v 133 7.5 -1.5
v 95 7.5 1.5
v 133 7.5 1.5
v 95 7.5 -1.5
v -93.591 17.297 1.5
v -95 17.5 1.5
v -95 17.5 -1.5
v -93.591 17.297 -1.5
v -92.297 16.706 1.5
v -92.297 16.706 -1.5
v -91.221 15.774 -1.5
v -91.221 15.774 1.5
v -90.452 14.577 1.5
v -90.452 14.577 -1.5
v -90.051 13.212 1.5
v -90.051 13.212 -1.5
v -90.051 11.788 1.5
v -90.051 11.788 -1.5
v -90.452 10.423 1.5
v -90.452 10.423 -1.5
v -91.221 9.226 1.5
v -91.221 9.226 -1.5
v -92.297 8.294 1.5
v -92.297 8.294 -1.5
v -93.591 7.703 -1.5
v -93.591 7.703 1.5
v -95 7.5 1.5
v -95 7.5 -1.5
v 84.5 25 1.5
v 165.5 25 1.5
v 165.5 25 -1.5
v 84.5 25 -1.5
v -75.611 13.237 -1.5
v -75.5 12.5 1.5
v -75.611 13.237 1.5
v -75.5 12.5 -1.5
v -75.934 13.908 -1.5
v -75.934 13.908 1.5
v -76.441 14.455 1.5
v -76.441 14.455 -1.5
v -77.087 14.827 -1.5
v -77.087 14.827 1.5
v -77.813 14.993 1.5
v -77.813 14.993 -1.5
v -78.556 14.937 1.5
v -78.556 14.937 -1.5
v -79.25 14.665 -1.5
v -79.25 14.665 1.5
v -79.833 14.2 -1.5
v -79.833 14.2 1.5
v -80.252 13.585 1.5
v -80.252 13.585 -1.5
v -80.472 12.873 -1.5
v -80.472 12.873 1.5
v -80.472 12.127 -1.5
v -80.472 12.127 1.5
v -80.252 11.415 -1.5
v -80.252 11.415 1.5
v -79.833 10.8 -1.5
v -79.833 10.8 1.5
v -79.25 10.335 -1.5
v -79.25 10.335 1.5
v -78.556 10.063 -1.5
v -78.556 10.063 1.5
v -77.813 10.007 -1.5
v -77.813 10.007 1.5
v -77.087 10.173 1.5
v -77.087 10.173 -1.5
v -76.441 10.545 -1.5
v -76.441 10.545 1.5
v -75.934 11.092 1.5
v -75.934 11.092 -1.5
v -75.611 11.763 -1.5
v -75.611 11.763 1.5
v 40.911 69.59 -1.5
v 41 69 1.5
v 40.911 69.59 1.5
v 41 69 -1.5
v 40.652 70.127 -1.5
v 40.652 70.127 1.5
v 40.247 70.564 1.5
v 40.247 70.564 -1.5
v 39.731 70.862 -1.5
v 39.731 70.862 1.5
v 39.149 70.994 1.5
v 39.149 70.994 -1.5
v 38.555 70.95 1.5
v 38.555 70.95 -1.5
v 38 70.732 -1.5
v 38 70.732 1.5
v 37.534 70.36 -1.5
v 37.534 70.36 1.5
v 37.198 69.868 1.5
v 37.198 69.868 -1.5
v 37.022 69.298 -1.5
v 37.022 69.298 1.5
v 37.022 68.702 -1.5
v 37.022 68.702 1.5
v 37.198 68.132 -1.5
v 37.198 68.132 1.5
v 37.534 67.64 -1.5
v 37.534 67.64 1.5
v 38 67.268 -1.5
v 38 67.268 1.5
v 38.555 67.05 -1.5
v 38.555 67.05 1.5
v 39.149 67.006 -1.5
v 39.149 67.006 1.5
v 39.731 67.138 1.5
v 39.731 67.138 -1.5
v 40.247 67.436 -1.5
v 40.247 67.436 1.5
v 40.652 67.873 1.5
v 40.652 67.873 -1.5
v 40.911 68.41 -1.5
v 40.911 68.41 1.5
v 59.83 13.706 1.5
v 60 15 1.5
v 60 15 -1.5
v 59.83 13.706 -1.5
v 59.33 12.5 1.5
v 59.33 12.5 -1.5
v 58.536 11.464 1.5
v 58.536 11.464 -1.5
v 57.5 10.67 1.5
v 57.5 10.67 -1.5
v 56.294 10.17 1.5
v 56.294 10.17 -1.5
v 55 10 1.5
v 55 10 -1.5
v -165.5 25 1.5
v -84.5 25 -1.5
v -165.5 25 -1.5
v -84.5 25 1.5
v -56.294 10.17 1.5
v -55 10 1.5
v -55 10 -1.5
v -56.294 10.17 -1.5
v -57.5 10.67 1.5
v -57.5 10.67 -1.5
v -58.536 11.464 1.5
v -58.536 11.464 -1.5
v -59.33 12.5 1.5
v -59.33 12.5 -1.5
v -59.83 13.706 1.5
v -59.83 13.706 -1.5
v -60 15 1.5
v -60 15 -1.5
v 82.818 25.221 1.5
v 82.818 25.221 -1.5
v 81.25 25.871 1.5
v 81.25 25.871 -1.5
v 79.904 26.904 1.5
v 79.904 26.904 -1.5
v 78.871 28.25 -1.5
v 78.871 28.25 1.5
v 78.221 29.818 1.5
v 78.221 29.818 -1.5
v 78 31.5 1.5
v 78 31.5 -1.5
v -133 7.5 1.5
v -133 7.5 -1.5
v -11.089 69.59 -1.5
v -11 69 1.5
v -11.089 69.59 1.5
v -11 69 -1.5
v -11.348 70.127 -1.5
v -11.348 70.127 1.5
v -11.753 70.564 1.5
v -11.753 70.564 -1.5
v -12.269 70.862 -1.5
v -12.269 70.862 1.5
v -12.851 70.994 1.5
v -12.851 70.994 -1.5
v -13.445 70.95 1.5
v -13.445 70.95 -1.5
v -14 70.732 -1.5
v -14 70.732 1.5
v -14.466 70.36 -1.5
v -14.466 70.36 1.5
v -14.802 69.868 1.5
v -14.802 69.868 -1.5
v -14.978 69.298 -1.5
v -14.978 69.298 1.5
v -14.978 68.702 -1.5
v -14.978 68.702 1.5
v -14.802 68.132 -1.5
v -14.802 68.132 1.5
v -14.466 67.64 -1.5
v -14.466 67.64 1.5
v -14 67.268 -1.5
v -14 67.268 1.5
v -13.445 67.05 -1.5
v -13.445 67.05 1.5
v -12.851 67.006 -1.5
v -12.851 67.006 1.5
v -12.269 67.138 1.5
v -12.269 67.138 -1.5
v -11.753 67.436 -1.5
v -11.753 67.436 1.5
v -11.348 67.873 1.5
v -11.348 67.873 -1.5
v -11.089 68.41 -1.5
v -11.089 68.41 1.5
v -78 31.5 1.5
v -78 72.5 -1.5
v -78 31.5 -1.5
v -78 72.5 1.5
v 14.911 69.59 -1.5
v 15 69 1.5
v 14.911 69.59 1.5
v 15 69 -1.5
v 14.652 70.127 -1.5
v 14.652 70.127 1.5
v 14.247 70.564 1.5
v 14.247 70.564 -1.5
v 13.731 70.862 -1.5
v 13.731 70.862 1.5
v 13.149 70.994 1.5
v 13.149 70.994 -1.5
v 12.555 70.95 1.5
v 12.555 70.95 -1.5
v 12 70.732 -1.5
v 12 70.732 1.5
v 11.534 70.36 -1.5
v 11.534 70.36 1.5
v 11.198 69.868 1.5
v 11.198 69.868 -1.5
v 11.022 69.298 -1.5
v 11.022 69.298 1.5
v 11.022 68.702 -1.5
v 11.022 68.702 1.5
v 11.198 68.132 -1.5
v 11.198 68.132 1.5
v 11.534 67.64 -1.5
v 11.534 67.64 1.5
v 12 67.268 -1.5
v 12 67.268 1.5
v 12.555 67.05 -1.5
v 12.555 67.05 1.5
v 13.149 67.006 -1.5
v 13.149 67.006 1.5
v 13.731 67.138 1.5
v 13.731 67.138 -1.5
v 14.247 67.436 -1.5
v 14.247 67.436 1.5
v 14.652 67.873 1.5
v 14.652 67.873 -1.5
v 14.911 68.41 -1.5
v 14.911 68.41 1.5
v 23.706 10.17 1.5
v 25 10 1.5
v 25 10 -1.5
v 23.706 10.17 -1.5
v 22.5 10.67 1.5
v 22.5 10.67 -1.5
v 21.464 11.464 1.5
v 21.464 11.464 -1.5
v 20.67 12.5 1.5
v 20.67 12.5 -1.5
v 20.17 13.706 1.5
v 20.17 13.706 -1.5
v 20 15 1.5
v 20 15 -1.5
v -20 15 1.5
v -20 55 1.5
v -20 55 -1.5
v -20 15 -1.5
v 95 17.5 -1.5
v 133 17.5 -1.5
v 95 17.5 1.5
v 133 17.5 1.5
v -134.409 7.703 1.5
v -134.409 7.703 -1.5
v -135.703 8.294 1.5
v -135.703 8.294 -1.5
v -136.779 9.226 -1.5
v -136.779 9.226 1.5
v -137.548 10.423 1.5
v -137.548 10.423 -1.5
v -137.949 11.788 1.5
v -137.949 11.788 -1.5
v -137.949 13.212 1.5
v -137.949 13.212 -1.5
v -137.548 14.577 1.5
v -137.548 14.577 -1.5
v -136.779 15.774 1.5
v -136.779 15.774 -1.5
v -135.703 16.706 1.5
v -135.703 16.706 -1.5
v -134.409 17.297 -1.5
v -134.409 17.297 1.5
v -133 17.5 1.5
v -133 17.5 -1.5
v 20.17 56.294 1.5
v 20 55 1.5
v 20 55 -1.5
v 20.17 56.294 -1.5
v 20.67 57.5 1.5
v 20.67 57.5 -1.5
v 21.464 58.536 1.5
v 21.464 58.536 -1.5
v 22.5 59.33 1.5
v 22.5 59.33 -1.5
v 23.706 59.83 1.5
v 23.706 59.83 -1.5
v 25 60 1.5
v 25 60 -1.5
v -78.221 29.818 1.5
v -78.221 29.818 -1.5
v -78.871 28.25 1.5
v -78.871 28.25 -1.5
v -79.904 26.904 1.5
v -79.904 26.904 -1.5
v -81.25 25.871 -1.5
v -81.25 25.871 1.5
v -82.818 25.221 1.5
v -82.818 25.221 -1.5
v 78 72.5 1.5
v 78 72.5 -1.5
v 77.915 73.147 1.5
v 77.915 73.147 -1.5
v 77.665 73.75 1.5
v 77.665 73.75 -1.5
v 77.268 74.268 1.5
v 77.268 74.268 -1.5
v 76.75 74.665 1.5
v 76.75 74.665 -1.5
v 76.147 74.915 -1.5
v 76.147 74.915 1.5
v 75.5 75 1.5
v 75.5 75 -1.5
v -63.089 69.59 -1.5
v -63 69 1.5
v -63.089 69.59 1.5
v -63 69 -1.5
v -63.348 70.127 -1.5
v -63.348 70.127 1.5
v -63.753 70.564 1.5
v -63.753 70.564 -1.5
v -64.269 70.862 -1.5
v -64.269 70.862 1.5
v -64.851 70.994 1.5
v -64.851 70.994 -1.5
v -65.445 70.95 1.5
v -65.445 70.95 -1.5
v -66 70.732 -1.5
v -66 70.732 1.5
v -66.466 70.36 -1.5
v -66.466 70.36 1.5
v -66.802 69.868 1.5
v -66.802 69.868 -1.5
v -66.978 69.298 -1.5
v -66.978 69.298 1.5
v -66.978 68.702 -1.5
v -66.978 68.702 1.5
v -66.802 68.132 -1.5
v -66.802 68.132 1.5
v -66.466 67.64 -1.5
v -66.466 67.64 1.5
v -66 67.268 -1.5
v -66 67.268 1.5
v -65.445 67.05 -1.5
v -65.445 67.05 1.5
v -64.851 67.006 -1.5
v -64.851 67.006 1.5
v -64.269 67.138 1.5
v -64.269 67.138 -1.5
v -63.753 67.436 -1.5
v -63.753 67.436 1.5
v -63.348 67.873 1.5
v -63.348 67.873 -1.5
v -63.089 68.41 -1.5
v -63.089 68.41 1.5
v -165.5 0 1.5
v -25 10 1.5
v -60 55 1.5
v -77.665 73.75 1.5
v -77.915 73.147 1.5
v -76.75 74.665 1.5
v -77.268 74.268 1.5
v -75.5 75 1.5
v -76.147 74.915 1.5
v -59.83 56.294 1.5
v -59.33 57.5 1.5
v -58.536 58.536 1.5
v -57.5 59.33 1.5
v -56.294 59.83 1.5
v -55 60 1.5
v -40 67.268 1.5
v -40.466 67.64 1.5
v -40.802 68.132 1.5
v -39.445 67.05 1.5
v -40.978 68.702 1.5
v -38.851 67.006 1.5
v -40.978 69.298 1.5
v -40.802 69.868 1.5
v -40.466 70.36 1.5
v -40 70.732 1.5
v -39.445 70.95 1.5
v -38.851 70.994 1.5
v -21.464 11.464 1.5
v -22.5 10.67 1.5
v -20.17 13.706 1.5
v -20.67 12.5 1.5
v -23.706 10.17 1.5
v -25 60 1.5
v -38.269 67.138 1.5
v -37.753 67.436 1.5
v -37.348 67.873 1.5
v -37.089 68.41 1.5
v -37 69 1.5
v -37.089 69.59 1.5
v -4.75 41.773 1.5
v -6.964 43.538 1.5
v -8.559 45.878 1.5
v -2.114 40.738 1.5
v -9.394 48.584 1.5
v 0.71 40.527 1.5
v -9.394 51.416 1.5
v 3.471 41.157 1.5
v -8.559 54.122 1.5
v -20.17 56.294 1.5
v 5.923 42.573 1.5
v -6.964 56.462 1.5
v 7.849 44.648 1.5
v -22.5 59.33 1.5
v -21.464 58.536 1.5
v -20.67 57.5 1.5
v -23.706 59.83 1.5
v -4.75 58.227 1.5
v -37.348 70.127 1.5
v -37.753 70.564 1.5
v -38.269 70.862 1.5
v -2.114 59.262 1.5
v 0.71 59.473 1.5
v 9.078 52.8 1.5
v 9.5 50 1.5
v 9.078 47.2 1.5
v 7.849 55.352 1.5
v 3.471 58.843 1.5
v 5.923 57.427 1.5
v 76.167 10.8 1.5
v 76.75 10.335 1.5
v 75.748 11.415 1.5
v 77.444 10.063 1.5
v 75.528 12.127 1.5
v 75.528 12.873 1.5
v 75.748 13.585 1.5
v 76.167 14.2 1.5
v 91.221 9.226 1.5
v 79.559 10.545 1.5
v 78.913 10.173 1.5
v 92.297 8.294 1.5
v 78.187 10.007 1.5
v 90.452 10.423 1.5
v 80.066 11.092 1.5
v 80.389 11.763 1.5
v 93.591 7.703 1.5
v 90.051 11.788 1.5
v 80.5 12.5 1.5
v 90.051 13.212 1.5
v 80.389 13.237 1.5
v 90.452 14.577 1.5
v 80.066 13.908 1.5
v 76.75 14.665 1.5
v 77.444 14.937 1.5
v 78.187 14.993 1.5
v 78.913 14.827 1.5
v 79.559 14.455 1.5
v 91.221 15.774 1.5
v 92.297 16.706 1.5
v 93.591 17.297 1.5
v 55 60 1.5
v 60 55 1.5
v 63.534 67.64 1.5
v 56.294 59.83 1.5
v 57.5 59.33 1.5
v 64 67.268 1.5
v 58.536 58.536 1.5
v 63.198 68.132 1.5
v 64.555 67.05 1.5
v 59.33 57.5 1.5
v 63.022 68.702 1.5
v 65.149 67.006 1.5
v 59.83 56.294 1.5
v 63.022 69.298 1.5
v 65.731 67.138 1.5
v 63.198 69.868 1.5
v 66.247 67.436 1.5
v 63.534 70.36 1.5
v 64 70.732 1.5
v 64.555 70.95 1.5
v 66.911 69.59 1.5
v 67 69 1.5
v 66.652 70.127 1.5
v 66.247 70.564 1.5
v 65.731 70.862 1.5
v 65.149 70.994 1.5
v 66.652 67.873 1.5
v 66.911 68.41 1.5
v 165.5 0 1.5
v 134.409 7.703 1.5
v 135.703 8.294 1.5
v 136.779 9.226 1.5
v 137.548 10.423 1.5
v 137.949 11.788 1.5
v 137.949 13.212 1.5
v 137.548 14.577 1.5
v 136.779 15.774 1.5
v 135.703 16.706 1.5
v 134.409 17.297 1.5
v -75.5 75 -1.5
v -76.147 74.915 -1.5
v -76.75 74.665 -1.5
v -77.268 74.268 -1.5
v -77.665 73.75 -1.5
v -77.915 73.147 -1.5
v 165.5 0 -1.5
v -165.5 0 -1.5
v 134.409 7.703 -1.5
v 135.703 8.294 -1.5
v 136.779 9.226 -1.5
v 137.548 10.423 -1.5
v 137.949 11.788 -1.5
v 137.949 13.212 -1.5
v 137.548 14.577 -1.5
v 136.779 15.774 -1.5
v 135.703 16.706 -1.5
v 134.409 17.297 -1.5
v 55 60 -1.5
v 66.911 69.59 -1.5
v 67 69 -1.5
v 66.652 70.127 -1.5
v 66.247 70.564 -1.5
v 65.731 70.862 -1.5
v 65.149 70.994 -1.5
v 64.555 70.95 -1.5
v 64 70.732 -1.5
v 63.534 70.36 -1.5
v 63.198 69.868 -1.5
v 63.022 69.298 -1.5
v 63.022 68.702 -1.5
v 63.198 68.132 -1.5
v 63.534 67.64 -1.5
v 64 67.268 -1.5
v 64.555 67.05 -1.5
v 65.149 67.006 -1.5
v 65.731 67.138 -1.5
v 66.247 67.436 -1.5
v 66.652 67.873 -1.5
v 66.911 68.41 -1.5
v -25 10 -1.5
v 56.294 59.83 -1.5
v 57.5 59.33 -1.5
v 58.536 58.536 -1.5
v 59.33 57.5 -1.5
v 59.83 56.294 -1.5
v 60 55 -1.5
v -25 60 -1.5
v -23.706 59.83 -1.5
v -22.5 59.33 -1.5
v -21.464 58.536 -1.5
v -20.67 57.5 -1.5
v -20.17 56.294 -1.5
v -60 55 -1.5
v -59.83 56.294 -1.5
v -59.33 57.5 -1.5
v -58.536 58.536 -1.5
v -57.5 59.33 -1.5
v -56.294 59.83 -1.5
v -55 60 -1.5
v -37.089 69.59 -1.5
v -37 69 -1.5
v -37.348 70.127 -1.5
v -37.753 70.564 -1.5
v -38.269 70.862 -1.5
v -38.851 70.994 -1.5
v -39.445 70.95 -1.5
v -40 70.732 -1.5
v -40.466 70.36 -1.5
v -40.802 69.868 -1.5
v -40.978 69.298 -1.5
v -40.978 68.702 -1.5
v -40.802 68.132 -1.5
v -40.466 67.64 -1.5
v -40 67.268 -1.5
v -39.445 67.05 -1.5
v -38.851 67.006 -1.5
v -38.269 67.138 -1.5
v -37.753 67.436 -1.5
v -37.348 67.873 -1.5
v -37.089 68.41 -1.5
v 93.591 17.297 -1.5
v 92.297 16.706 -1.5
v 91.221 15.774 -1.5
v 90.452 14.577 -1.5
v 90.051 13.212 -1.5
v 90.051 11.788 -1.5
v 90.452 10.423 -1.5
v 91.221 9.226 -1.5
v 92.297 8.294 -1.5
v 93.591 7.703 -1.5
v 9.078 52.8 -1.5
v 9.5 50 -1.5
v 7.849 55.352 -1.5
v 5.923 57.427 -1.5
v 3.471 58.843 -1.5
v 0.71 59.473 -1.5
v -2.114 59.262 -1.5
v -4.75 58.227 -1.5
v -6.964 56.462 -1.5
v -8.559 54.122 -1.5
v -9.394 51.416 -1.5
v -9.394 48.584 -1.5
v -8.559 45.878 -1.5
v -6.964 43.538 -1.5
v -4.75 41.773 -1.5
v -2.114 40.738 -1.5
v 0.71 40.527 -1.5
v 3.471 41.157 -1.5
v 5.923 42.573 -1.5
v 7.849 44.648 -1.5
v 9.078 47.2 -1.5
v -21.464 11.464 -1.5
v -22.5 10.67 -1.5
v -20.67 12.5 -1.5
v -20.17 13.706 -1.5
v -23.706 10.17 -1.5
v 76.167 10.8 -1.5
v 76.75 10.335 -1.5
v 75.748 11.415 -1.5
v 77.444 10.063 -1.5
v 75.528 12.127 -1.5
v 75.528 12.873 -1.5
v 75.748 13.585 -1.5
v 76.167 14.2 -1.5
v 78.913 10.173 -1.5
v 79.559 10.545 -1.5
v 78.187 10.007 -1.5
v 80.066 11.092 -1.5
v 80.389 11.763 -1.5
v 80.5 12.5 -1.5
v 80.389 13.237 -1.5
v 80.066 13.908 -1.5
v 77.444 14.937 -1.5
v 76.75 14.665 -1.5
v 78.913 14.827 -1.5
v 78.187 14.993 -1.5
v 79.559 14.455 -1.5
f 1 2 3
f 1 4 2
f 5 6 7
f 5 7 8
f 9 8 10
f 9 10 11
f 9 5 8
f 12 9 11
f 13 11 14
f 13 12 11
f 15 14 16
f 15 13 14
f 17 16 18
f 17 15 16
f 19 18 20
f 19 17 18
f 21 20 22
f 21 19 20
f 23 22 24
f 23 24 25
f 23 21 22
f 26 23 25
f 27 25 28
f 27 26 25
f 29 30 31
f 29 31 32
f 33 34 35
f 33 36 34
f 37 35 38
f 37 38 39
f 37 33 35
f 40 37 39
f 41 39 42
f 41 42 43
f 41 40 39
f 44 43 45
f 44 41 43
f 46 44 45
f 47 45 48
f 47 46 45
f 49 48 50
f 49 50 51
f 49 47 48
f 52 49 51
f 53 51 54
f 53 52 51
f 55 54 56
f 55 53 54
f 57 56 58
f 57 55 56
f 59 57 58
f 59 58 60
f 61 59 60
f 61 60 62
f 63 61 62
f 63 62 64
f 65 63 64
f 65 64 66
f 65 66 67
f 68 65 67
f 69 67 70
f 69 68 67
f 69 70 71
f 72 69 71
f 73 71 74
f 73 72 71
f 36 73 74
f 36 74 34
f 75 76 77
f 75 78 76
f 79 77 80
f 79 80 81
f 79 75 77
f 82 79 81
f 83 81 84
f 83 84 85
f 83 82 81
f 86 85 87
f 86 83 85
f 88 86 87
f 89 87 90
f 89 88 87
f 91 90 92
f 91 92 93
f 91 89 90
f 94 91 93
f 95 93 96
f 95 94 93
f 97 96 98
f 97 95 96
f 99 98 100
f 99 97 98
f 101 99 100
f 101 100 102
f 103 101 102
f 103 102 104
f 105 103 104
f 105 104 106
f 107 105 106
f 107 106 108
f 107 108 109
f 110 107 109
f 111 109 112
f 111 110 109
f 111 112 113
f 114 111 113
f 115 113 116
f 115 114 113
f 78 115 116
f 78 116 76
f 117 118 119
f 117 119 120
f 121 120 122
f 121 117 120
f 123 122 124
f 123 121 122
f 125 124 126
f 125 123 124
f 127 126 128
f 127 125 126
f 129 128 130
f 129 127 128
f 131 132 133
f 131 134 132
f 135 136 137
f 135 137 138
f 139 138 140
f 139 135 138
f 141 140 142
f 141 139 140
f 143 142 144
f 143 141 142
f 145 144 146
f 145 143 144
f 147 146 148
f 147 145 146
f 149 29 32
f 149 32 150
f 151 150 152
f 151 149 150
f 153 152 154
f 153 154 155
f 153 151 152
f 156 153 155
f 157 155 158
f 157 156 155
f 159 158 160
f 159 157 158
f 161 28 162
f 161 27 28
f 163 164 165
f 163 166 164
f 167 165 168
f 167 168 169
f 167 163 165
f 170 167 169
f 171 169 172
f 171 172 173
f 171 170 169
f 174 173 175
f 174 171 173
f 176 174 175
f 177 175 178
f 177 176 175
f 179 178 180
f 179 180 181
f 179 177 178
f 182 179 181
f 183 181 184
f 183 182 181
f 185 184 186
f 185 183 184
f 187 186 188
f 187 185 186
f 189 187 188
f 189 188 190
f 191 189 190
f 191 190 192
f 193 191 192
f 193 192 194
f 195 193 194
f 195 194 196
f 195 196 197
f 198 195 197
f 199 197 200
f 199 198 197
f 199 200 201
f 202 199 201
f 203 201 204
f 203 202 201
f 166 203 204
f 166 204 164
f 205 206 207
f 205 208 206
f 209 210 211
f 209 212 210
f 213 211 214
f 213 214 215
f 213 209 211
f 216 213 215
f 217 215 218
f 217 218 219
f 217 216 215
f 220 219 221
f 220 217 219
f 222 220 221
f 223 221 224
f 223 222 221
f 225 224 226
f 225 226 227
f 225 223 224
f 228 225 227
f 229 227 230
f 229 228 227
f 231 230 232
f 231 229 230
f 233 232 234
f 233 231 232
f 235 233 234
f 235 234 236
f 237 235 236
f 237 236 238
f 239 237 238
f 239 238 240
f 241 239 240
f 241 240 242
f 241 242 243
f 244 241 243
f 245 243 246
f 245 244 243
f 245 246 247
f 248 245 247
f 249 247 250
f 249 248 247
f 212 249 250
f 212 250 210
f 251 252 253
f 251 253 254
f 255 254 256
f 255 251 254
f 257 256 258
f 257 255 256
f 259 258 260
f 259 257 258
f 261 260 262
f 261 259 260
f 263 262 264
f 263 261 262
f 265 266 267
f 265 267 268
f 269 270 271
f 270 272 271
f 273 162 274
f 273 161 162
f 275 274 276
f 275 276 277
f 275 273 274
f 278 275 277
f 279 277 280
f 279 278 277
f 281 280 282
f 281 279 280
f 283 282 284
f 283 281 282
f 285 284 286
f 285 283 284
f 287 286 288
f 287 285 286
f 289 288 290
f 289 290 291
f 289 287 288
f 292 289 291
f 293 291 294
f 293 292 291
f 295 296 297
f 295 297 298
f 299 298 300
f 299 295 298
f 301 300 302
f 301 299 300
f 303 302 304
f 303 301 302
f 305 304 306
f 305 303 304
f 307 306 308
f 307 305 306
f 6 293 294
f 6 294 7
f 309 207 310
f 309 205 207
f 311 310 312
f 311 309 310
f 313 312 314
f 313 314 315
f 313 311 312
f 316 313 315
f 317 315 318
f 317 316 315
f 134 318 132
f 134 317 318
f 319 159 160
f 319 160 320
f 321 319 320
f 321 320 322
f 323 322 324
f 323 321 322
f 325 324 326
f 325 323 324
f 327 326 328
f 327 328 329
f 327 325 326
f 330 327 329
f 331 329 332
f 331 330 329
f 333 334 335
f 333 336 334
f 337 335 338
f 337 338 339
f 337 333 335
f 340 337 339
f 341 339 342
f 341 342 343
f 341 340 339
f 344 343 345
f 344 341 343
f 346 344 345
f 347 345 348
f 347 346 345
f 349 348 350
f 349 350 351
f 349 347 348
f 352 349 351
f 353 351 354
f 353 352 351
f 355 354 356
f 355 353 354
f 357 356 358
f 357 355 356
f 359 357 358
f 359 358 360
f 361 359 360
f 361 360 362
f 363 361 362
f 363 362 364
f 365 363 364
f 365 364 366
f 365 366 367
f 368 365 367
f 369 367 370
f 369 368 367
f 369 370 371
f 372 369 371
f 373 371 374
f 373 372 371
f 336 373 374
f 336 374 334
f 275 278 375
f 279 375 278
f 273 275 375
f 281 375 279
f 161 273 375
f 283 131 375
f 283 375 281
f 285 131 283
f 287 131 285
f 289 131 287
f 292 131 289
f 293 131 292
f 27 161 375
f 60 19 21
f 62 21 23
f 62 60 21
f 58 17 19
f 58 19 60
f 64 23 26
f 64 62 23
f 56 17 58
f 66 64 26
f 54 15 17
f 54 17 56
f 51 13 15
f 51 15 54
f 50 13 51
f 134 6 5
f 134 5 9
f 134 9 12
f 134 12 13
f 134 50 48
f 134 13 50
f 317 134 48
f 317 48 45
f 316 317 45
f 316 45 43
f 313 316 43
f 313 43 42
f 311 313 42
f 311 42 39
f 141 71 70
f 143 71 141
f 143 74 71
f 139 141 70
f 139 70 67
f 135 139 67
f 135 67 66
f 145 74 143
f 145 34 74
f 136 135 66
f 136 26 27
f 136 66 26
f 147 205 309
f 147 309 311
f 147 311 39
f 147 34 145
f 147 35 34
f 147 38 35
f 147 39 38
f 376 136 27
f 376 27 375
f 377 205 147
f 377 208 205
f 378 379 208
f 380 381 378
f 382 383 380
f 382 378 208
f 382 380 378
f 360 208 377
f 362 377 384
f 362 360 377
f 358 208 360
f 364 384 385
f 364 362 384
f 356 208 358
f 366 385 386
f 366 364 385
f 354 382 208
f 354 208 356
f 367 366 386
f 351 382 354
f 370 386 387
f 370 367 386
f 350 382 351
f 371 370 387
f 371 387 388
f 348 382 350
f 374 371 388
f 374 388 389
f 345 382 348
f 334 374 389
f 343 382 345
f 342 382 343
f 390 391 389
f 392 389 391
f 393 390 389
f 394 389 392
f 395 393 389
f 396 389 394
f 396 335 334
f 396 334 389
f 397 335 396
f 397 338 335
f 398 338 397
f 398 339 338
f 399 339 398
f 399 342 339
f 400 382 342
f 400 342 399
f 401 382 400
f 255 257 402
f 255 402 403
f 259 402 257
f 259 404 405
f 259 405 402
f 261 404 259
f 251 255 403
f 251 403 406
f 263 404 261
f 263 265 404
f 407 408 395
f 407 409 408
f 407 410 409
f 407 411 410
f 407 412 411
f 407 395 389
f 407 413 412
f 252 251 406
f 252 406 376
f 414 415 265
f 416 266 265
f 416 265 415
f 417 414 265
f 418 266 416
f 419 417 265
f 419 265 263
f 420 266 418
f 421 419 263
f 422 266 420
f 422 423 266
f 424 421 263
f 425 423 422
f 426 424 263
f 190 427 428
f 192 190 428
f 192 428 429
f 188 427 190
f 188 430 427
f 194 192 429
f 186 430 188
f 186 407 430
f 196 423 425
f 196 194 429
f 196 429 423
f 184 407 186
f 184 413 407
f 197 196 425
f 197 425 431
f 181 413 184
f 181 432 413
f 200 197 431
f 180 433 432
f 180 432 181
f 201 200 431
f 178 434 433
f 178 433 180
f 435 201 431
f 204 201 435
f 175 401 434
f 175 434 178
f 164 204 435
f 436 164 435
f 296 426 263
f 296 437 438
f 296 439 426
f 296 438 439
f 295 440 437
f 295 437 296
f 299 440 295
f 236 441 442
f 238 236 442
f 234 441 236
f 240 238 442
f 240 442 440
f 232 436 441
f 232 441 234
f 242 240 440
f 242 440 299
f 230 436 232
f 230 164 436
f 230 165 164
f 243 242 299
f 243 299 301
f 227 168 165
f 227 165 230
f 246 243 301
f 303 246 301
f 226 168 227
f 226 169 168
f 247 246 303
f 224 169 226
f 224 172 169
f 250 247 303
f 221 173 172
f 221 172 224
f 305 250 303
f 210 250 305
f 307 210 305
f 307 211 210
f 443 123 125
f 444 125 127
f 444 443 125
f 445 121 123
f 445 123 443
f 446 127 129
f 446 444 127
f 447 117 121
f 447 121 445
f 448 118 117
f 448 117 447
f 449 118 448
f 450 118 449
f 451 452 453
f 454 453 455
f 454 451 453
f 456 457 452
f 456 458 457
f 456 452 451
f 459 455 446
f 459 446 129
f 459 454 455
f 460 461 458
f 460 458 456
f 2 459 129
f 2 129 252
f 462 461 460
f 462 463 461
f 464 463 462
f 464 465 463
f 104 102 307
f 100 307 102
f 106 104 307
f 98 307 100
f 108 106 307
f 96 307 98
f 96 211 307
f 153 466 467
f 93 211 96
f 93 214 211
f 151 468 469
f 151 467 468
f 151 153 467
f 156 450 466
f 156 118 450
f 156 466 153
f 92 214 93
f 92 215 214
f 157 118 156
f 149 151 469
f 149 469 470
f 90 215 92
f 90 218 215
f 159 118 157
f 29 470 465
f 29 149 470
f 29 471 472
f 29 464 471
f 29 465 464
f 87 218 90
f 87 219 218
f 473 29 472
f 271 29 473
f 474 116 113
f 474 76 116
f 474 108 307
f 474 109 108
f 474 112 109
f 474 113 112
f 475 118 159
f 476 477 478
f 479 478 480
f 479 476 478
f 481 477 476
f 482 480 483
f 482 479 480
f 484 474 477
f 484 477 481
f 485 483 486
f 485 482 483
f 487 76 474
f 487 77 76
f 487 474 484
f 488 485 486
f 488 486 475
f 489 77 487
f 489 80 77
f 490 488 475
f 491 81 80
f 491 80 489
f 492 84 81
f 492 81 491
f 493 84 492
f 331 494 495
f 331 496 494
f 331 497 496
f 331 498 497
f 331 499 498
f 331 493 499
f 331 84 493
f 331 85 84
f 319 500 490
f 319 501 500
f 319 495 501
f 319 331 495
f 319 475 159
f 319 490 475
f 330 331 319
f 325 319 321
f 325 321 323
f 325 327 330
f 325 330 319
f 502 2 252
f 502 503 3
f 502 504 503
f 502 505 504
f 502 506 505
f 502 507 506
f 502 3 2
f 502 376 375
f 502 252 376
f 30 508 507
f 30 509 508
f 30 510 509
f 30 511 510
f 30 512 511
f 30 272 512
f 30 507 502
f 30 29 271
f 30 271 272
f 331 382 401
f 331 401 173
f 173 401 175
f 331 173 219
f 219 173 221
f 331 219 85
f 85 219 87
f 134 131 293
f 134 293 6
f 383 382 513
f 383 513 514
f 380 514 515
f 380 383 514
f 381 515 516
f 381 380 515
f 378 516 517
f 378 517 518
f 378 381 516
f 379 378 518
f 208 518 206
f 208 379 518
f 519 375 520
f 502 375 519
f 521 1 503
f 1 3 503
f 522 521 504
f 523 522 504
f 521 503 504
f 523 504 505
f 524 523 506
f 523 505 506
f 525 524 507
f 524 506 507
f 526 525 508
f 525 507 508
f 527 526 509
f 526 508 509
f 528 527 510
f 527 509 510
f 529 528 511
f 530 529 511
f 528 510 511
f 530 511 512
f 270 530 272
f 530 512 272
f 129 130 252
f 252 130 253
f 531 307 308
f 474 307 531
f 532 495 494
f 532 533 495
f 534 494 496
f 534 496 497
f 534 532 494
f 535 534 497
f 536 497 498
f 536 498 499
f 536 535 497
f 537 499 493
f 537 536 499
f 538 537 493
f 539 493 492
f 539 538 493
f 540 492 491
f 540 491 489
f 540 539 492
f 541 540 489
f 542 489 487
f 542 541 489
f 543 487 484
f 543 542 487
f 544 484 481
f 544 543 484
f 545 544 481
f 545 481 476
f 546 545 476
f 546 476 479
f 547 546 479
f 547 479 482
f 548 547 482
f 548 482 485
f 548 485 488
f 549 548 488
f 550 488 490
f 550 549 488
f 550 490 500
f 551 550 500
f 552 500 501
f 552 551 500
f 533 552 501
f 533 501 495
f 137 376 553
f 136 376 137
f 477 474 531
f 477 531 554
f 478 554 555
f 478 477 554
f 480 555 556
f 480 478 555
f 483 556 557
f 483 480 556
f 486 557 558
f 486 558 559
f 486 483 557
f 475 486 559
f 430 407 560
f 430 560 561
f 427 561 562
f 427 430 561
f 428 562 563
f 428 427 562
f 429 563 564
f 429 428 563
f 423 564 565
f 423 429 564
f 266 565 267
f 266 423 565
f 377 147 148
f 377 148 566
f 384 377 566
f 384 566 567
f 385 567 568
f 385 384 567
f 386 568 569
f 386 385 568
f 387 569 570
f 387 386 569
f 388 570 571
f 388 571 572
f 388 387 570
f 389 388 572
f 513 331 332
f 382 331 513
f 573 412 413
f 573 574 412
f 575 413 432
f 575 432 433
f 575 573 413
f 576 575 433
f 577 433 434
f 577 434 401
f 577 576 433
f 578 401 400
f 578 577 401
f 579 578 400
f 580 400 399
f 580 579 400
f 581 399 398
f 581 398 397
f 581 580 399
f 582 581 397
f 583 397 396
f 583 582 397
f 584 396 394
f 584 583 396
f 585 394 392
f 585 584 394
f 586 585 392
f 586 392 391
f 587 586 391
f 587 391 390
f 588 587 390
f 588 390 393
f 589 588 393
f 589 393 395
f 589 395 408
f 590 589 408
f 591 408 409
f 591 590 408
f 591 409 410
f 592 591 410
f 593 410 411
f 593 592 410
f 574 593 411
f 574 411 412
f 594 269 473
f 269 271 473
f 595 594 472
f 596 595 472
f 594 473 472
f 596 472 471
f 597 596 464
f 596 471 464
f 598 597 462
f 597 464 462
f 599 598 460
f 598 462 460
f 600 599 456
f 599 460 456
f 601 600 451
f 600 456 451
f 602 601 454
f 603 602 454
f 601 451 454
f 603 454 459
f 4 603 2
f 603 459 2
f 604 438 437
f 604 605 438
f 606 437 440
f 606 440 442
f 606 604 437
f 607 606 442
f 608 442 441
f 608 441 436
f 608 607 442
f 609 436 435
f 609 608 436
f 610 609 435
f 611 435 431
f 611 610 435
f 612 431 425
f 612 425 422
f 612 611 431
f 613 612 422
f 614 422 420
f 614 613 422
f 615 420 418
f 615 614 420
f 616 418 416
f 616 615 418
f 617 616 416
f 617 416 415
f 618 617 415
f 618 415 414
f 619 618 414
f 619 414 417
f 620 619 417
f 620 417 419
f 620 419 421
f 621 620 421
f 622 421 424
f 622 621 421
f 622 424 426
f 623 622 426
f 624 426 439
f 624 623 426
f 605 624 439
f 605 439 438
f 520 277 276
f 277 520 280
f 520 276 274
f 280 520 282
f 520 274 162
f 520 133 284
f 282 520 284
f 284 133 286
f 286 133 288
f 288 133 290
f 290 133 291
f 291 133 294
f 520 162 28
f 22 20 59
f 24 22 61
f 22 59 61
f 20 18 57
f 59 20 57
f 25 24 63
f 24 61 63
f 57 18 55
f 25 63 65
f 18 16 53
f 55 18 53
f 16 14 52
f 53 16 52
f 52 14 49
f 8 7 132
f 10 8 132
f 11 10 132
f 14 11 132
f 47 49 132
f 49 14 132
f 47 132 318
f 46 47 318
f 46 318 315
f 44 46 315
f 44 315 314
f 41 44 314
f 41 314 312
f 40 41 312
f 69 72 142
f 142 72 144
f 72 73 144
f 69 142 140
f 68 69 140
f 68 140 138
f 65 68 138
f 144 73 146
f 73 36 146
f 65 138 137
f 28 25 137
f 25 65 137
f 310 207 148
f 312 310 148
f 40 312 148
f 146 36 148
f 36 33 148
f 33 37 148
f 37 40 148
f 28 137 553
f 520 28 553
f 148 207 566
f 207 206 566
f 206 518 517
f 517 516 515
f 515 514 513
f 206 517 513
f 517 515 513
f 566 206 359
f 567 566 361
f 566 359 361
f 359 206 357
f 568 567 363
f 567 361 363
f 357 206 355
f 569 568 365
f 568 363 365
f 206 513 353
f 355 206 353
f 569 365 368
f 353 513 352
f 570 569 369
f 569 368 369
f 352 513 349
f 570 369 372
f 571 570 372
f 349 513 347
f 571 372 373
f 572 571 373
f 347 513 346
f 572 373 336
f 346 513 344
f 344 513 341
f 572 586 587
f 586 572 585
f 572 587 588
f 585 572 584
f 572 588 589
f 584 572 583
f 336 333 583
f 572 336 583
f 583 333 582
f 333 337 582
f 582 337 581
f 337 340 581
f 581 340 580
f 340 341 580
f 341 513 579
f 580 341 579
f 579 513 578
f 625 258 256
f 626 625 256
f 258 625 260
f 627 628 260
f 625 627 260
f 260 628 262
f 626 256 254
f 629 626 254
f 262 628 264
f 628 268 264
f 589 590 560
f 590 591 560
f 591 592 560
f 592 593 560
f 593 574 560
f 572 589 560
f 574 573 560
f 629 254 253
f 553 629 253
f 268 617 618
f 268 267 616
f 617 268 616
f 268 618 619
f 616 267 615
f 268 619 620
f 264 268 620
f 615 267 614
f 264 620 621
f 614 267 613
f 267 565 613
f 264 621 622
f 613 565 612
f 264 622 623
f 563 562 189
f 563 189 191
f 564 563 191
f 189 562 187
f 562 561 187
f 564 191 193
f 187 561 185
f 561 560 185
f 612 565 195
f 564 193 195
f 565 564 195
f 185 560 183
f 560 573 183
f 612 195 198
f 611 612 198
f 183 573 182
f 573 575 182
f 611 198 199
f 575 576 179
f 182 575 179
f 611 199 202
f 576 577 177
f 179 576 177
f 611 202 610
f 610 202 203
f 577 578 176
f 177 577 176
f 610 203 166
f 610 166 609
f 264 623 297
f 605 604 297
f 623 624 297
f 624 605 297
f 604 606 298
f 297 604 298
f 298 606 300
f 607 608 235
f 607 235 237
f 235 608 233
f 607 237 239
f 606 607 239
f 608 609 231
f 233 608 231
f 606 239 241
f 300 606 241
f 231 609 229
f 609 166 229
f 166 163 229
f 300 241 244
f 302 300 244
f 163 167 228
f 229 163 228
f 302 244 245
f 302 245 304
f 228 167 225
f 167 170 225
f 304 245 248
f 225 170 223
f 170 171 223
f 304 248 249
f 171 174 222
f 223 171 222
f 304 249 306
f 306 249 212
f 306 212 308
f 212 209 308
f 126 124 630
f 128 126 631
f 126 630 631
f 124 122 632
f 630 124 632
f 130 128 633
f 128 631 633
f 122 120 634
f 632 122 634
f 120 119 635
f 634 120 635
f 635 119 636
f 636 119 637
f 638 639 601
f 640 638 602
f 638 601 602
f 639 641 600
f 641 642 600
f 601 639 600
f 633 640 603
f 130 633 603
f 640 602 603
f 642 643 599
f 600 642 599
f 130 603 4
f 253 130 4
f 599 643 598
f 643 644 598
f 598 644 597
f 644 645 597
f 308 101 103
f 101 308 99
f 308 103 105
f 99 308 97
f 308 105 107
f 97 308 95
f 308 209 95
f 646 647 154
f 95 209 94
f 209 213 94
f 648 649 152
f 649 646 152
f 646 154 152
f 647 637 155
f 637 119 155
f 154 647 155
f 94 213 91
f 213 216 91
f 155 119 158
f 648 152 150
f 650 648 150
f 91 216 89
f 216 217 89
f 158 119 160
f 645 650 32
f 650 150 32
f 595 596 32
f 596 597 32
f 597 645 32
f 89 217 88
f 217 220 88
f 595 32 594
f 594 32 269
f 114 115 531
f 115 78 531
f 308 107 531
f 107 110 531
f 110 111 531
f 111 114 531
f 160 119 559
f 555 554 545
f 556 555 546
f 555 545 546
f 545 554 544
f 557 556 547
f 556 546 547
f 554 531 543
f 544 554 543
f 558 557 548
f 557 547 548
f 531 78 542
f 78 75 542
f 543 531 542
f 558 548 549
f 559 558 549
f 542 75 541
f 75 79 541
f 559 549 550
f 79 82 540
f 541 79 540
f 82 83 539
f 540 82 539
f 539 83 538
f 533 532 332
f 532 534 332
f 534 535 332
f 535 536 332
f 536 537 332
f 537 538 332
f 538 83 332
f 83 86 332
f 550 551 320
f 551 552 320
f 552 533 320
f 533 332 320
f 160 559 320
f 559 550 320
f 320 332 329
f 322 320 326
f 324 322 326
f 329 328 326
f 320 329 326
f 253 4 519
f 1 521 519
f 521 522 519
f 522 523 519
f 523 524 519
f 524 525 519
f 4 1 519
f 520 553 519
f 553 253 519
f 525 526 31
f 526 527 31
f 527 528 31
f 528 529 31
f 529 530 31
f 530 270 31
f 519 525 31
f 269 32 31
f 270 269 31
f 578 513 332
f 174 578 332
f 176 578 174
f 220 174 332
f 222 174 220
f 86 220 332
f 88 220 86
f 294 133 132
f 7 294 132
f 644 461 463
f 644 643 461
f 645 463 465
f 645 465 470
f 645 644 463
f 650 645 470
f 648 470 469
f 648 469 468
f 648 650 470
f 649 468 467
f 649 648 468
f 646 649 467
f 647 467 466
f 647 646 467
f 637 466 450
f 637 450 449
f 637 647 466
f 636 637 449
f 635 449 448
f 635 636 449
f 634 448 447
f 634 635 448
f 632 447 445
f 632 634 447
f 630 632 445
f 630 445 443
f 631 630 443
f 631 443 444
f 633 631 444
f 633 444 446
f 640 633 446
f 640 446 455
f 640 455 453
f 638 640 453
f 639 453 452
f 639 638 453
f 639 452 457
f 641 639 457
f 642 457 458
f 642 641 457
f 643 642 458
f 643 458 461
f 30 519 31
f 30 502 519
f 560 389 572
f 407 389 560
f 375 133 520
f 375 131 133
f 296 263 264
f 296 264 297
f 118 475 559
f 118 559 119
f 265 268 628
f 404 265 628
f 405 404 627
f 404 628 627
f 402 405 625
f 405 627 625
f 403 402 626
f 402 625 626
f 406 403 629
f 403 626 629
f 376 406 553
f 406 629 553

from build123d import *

# Parameters (mm, degrees)
SKETCH1_R           = 9.5
SKETCH1_R_2         = 2
SKETCH1_R_3         = 2.5
BOSS_EXTRUDE1_DEPTH = 1.5


with BuildPart() as part:
    # Sketch1 → Boss-Extrude1 (new, symmetric)
    with BuildSketch(Plane.XY):
        with BuildLine():
            Line((165.5, 0), (165.5, 25))
            Line((165.5, 25), (84.5, 25))
            ThreePointArc((84.5, 25), (79.903805922, 26.903805922), (78, 31.5))
            Line((78, 31.5), (78, 72.5))
            ThreePointArc((78, 72.5), (77.267766953, 74.267766953), (75.5, 75))
            Line((75.5, 75), (-75.5, 75))
            ThreePointArc((-75.5, 75), (-77.267766953, 74.267766953), (-78, 72.5))
            Line((-78, 72.5), (-78, 31.5))
            ThreePointArc((-78, 31.5), (-79.903805922, 26.903805922), (-84.5, 25))
            Line((-84.5, 25), (-165.5, 25))
            Line((-165.5, 25), (-165.5, 0))
            Line((-165.5, 0), (165.5, 0))
        make_face()
        with Locations((0, 50)):
            Circle(SKETCH1_R, mode=Mode.SUBTRACT)
        with Locations((-65, 69)):
            Circle(SKETCH1_R_2, mode=Mode.SUBTRACT)
        with Locations((-39, 69)):
            Circle(SKETCH1_R_2, mode=Mode.SUBTRACT)
        with Locations((-13, 69)):
            Circle(SKETCH1_R_2, mode=Mode.SUBTRACT)
        with Locations((13, 69)):
            Circle(SKETCH1_R_2, mode=Mode.SUBTRACT)
        with Locations((39, 69)):
            Circle(SKETCH1_R_2, mode=Mode.SUBTRACT)
        with Locations((65, 69)):
            Circle(SKETCH1_R_2, mode=Mode.SUBTRACT)
        with Locations((-78, 12.5)):
            Circle(SKETCH1_R_3, mode=Mode.SUBTRACT)
        with Locations((78, 12.5)):
            Circle(SKETCH1_R_3, mode=Mode.SUBTRACT)
        with BuildLine():
            Line((-55, 60), (-25, 60))
            ThreePointArc((-25, 60), (-21.464466094, 58.535533906), (-20, 55))
            Line((-20, 55), (-20, 15))
            ThreePointArc((-20, 15), (-21.464466094, 11.464466094), (-25, 10))
            Line((-25, 10), (-55, 10))
            ThreePointArc((-55, 10), (-58.535533906, 11.464466094), (-60, 15))
            Line((-60, 15), (-60, 55))
            ThreePointArc((-60, 55), (-58.535533906, 58.535533906), (-55, 60))
        make_face(mode=Mode.SUBTRACT)
        with BuildLine():
            Line((-133, 17.5), (-95, 17.5))
            ThreePointArc((-95, 17.5), (-90, 12.5), (-95, 7.5))
            Line((-95, 7.5), (-133, 7.5))
            ThreePointArc((-133, 7.5), (-138, 12.5), (-133, 17.5))
        make_face(mode=Mode.SUBTRACT)
        with BuildLine():
            Line((133, 17.5), (95, 17.5))
            ThreePointArc((95, 17.5), (90, 12.5), (95, 7.5))
            Line((95, 7.5), (133, 7.5))
            ThreePointArc((133, 7.5), (138, 12.5), (133, 17.5))
        make_face(mode=Mode.SUBTRACT)
        with BuildLine():
            Line((55, 10), (25, 10))
            ThreePointArc((25, 10), (21.464466094, 11.464466094), (20, 15))
            Line((20, 15), (20, 55))
            ThreePointArc((20, 55), (21.464466094, 58.535533906), (25, 60))
            Line((25, 60), (55, 60))
            ThreePointArc((55, 60), (58.535533906, 58.535533906), (60, 55))
            Line((60, 55), (60, 15))
            ThreePointArc((60, 15), (58.535533906, 11.464466094), (55, 10))
        make_face(mode=Mode.SUBTRACT)
    extrude(amount=BOSS_EXTRUDE1_DEPTH, both=True)


solid = part.part
